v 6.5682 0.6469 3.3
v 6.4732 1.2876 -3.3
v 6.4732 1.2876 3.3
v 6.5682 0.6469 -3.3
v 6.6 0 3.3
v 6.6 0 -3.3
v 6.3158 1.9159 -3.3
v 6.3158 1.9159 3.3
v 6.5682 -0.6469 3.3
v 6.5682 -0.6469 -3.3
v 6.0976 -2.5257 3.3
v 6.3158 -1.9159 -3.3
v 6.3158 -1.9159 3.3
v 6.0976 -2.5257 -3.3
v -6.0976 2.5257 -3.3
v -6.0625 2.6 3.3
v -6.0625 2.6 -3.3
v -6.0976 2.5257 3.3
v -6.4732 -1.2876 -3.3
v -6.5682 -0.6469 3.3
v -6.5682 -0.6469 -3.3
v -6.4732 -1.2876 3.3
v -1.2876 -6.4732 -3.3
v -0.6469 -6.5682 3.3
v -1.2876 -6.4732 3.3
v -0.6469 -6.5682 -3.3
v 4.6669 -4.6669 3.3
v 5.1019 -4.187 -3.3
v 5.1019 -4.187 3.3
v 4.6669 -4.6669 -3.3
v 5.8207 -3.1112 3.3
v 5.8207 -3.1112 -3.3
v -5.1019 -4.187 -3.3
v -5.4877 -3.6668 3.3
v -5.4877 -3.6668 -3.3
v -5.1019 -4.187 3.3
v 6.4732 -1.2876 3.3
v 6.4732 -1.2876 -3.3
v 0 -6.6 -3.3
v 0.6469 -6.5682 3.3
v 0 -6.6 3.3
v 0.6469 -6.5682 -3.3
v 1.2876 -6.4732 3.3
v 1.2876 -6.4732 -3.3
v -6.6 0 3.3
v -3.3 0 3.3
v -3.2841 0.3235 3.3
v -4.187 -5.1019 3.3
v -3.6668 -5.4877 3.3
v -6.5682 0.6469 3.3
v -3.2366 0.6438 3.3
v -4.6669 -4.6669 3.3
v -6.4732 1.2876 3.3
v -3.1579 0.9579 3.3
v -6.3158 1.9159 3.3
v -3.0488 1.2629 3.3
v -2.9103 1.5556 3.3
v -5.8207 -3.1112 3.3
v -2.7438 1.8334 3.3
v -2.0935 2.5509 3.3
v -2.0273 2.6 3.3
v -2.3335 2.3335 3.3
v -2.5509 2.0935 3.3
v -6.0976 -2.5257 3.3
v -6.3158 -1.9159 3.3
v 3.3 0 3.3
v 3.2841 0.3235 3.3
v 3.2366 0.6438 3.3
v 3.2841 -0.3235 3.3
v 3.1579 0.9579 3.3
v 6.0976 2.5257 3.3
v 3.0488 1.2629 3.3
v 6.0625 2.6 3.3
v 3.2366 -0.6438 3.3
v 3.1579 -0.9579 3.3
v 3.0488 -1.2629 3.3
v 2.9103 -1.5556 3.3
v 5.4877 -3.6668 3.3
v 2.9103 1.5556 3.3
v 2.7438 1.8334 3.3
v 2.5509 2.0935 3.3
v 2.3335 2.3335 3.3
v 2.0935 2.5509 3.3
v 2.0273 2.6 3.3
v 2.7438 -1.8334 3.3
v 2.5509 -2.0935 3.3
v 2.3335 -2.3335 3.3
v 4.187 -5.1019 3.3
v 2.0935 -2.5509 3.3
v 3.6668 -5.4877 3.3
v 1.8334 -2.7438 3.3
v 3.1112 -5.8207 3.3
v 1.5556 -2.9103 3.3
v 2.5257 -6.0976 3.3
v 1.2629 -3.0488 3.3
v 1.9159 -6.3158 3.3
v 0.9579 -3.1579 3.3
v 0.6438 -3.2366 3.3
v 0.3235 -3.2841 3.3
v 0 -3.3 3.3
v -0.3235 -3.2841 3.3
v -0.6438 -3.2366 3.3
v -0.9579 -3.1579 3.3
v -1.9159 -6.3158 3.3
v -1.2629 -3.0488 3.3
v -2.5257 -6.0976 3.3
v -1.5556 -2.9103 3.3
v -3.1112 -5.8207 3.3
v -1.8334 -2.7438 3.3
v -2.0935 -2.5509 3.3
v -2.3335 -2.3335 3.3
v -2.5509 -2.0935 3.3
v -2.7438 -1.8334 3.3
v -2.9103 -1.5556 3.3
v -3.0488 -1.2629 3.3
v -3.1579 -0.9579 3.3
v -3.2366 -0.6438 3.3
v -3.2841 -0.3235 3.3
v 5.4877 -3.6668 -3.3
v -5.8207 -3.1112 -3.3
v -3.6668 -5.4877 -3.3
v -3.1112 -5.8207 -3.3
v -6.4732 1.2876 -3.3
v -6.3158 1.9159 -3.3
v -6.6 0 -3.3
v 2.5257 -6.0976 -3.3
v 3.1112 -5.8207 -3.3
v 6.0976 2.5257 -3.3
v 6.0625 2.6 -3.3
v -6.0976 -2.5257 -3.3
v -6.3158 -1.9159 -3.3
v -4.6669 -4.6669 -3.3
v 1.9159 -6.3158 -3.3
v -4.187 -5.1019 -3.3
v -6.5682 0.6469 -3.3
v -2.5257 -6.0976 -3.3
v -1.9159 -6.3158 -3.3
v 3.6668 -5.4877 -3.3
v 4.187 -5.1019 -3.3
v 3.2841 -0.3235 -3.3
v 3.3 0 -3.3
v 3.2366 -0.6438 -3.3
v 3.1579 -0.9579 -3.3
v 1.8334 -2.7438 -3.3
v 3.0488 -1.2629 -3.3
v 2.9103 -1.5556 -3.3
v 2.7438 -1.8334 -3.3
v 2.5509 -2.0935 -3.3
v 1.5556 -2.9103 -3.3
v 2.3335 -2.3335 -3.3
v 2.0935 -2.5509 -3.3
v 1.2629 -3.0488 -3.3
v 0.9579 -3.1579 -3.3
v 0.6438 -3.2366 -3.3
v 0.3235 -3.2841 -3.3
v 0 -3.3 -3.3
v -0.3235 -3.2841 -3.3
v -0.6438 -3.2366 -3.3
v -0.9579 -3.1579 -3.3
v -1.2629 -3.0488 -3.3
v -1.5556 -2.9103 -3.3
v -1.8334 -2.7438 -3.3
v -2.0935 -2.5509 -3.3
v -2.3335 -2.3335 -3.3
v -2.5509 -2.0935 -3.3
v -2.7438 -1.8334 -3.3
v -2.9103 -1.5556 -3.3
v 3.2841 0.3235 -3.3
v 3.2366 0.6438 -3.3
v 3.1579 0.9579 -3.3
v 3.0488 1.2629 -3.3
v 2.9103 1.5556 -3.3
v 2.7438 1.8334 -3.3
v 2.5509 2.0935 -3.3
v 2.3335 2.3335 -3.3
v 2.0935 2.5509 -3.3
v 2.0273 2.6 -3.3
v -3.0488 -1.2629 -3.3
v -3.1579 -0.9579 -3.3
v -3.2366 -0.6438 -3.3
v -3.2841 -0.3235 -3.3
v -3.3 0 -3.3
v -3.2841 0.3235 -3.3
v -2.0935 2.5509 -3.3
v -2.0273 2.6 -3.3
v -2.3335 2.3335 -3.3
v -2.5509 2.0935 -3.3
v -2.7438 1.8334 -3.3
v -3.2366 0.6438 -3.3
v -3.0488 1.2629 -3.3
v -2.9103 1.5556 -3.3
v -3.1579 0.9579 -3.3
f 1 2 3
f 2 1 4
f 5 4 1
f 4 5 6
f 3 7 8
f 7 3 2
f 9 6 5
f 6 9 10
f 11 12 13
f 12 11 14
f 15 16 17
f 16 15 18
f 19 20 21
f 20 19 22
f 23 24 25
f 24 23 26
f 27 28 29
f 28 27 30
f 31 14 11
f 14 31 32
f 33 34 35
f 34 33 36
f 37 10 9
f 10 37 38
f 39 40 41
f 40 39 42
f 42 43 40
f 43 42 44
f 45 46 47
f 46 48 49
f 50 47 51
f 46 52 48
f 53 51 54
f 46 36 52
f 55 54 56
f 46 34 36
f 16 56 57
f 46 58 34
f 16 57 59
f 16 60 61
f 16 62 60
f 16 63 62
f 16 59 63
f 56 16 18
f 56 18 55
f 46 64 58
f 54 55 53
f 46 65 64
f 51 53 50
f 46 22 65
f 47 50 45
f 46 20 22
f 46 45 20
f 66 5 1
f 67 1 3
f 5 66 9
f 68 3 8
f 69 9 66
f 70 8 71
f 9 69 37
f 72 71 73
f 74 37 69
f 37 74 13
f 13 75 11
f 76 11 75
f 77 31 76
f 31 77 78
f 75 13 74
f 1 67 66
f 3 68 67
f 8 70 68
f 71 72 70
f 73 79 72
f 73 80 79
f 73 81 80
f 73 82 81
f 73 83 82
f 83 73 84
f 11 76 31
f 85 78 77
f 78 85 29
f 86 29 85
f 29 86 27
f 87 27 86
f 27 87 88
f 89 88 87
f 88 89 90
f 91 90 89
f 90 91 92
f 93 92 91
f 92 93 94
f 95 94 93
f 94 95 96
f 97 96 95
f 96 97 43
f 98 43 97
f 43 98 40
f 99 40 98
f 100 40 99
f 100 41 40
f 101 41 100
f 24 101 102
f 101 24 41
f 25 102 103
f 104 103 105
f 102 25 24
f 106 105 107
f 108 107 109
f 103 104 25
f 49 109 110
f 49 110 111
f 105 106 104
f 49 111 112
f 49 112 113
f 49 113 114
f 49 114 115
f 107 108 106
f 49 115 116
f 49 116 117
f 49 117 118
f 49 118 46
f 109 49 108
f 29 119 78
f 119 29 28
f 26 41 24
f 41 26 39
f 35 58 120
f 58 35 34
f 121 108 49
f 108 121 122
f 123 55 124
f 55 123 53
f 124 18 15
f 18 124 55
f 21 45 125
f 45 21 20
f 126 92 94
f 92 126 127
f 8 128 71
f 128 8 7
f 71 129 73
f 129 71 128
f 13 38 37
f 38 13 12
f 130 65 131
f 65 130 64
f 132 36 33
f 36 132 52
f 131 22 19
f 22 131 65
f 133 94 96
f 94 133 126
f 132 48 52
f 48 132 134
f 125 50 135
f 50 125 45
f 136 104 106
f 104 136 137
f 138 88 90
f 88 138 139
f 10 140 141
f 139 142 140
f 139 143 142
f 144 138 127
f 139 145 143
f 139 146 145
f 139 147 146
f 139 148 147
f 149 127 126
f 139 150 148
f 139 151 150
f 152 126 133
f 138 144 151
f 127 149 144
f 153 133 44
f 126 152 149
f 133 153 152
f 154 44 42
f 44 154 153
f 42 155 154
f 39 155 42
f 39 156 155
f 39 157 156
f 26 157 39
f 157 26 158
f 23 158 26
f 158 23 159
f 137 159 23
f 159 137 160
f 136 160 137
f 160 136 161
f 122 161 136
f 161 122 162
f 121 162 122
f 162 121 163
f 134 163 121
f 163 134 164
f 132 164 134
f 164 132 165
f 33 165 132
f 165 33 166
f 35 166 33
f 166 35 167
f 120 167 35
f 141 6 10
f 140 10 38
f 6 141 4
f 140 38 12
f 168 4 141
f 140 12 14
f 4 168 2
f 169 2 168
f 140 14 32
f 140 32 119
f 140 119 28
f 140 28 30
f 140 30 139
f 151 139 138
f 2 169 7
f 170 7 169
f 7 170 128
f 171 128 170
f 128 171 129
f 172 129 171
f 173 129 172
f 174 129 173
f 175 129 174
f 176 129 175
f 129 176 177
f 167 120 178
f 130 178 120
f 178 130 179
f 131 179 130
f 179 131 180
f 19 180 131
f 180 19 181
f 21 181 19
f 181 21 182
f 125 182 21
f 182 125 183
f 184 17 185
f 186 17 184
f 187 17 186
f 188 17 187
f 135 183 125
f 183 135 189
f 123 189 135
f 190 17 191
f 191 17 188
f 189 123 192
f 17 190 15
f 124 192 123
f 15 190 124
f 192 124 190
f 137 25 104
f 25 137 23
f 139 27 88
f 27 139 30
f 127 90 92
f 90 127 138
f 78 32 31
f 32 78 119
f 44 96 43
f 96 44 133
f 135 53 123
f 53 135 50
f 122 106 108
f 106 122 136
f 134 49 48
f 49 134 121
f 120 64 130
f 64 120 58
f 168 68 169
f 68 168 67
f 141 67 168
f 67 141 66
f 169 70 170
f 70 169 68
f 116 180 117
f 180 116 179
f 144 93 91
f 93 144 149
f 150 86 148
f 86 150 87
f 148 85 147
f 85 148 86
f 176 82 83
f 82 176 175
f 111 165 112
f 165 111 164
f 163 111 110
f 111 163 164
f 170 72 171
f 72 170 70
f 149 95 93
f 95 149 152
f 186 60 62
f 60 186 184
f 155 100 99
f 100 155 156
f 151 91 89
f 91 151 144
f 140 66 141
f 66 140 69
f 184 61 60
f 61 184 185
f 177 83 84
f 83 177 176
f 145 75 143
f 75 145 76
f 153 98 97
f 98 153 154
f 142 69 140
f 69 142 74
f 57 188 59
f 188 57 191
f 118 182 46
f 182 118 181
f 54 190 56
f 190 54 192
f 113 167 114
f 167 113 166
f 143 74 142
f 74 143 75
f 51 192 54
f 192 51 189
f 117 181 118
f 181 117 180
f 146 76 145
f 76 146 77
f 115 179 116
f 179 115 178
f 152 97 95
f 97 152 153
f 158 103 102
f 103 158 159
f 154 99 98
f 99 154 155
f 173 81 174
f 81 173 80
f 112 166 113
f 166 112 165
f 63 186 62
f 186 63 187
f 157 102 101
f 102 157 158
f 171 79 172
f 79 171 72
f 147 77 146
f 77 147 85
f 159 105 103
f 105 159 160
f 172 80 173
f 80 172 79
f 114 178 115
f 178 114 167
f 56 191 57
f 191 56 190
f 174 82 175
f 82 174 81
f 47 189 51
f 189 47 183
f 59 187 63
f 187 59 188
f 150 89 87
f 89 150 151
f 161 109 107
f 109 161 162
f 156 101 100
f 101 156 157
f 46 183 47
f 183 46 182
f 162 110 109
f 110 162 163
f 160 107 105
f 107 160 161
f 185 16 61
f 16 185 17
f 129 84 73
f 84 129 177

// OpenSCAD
// COBRA Vertebra - T8 V14
// Height: 6.6000000000000005mm, OD: 13.200000000000001mm

$fn = 64;

difference() {
    // Outer cylinder
    cylinder(h=6.6000000000000005, d=13.200000000000001, center=true);
    
    // Inner channel
    cylinder(h=8.600000000000001, d=6.6000000000000005, center=true);

    // Solar panel cavity
    translate([0, 4.6000000000000005, 0])
    cube([50, 4, 30], center=true);

    // Pivot holes
    translate([0, 6.6000000000000005, 0.30000000000000027])
    rotate([90, 0, 0])
    cylinder(h=5.300000000000001, d=4, center=true);
    
    translate([0, 6.6000000000000005, -0.30000000000000027])
    rotate([90, 0, 0])
    cylinder(h=5.300000000000001, d=4, center=true);
}
